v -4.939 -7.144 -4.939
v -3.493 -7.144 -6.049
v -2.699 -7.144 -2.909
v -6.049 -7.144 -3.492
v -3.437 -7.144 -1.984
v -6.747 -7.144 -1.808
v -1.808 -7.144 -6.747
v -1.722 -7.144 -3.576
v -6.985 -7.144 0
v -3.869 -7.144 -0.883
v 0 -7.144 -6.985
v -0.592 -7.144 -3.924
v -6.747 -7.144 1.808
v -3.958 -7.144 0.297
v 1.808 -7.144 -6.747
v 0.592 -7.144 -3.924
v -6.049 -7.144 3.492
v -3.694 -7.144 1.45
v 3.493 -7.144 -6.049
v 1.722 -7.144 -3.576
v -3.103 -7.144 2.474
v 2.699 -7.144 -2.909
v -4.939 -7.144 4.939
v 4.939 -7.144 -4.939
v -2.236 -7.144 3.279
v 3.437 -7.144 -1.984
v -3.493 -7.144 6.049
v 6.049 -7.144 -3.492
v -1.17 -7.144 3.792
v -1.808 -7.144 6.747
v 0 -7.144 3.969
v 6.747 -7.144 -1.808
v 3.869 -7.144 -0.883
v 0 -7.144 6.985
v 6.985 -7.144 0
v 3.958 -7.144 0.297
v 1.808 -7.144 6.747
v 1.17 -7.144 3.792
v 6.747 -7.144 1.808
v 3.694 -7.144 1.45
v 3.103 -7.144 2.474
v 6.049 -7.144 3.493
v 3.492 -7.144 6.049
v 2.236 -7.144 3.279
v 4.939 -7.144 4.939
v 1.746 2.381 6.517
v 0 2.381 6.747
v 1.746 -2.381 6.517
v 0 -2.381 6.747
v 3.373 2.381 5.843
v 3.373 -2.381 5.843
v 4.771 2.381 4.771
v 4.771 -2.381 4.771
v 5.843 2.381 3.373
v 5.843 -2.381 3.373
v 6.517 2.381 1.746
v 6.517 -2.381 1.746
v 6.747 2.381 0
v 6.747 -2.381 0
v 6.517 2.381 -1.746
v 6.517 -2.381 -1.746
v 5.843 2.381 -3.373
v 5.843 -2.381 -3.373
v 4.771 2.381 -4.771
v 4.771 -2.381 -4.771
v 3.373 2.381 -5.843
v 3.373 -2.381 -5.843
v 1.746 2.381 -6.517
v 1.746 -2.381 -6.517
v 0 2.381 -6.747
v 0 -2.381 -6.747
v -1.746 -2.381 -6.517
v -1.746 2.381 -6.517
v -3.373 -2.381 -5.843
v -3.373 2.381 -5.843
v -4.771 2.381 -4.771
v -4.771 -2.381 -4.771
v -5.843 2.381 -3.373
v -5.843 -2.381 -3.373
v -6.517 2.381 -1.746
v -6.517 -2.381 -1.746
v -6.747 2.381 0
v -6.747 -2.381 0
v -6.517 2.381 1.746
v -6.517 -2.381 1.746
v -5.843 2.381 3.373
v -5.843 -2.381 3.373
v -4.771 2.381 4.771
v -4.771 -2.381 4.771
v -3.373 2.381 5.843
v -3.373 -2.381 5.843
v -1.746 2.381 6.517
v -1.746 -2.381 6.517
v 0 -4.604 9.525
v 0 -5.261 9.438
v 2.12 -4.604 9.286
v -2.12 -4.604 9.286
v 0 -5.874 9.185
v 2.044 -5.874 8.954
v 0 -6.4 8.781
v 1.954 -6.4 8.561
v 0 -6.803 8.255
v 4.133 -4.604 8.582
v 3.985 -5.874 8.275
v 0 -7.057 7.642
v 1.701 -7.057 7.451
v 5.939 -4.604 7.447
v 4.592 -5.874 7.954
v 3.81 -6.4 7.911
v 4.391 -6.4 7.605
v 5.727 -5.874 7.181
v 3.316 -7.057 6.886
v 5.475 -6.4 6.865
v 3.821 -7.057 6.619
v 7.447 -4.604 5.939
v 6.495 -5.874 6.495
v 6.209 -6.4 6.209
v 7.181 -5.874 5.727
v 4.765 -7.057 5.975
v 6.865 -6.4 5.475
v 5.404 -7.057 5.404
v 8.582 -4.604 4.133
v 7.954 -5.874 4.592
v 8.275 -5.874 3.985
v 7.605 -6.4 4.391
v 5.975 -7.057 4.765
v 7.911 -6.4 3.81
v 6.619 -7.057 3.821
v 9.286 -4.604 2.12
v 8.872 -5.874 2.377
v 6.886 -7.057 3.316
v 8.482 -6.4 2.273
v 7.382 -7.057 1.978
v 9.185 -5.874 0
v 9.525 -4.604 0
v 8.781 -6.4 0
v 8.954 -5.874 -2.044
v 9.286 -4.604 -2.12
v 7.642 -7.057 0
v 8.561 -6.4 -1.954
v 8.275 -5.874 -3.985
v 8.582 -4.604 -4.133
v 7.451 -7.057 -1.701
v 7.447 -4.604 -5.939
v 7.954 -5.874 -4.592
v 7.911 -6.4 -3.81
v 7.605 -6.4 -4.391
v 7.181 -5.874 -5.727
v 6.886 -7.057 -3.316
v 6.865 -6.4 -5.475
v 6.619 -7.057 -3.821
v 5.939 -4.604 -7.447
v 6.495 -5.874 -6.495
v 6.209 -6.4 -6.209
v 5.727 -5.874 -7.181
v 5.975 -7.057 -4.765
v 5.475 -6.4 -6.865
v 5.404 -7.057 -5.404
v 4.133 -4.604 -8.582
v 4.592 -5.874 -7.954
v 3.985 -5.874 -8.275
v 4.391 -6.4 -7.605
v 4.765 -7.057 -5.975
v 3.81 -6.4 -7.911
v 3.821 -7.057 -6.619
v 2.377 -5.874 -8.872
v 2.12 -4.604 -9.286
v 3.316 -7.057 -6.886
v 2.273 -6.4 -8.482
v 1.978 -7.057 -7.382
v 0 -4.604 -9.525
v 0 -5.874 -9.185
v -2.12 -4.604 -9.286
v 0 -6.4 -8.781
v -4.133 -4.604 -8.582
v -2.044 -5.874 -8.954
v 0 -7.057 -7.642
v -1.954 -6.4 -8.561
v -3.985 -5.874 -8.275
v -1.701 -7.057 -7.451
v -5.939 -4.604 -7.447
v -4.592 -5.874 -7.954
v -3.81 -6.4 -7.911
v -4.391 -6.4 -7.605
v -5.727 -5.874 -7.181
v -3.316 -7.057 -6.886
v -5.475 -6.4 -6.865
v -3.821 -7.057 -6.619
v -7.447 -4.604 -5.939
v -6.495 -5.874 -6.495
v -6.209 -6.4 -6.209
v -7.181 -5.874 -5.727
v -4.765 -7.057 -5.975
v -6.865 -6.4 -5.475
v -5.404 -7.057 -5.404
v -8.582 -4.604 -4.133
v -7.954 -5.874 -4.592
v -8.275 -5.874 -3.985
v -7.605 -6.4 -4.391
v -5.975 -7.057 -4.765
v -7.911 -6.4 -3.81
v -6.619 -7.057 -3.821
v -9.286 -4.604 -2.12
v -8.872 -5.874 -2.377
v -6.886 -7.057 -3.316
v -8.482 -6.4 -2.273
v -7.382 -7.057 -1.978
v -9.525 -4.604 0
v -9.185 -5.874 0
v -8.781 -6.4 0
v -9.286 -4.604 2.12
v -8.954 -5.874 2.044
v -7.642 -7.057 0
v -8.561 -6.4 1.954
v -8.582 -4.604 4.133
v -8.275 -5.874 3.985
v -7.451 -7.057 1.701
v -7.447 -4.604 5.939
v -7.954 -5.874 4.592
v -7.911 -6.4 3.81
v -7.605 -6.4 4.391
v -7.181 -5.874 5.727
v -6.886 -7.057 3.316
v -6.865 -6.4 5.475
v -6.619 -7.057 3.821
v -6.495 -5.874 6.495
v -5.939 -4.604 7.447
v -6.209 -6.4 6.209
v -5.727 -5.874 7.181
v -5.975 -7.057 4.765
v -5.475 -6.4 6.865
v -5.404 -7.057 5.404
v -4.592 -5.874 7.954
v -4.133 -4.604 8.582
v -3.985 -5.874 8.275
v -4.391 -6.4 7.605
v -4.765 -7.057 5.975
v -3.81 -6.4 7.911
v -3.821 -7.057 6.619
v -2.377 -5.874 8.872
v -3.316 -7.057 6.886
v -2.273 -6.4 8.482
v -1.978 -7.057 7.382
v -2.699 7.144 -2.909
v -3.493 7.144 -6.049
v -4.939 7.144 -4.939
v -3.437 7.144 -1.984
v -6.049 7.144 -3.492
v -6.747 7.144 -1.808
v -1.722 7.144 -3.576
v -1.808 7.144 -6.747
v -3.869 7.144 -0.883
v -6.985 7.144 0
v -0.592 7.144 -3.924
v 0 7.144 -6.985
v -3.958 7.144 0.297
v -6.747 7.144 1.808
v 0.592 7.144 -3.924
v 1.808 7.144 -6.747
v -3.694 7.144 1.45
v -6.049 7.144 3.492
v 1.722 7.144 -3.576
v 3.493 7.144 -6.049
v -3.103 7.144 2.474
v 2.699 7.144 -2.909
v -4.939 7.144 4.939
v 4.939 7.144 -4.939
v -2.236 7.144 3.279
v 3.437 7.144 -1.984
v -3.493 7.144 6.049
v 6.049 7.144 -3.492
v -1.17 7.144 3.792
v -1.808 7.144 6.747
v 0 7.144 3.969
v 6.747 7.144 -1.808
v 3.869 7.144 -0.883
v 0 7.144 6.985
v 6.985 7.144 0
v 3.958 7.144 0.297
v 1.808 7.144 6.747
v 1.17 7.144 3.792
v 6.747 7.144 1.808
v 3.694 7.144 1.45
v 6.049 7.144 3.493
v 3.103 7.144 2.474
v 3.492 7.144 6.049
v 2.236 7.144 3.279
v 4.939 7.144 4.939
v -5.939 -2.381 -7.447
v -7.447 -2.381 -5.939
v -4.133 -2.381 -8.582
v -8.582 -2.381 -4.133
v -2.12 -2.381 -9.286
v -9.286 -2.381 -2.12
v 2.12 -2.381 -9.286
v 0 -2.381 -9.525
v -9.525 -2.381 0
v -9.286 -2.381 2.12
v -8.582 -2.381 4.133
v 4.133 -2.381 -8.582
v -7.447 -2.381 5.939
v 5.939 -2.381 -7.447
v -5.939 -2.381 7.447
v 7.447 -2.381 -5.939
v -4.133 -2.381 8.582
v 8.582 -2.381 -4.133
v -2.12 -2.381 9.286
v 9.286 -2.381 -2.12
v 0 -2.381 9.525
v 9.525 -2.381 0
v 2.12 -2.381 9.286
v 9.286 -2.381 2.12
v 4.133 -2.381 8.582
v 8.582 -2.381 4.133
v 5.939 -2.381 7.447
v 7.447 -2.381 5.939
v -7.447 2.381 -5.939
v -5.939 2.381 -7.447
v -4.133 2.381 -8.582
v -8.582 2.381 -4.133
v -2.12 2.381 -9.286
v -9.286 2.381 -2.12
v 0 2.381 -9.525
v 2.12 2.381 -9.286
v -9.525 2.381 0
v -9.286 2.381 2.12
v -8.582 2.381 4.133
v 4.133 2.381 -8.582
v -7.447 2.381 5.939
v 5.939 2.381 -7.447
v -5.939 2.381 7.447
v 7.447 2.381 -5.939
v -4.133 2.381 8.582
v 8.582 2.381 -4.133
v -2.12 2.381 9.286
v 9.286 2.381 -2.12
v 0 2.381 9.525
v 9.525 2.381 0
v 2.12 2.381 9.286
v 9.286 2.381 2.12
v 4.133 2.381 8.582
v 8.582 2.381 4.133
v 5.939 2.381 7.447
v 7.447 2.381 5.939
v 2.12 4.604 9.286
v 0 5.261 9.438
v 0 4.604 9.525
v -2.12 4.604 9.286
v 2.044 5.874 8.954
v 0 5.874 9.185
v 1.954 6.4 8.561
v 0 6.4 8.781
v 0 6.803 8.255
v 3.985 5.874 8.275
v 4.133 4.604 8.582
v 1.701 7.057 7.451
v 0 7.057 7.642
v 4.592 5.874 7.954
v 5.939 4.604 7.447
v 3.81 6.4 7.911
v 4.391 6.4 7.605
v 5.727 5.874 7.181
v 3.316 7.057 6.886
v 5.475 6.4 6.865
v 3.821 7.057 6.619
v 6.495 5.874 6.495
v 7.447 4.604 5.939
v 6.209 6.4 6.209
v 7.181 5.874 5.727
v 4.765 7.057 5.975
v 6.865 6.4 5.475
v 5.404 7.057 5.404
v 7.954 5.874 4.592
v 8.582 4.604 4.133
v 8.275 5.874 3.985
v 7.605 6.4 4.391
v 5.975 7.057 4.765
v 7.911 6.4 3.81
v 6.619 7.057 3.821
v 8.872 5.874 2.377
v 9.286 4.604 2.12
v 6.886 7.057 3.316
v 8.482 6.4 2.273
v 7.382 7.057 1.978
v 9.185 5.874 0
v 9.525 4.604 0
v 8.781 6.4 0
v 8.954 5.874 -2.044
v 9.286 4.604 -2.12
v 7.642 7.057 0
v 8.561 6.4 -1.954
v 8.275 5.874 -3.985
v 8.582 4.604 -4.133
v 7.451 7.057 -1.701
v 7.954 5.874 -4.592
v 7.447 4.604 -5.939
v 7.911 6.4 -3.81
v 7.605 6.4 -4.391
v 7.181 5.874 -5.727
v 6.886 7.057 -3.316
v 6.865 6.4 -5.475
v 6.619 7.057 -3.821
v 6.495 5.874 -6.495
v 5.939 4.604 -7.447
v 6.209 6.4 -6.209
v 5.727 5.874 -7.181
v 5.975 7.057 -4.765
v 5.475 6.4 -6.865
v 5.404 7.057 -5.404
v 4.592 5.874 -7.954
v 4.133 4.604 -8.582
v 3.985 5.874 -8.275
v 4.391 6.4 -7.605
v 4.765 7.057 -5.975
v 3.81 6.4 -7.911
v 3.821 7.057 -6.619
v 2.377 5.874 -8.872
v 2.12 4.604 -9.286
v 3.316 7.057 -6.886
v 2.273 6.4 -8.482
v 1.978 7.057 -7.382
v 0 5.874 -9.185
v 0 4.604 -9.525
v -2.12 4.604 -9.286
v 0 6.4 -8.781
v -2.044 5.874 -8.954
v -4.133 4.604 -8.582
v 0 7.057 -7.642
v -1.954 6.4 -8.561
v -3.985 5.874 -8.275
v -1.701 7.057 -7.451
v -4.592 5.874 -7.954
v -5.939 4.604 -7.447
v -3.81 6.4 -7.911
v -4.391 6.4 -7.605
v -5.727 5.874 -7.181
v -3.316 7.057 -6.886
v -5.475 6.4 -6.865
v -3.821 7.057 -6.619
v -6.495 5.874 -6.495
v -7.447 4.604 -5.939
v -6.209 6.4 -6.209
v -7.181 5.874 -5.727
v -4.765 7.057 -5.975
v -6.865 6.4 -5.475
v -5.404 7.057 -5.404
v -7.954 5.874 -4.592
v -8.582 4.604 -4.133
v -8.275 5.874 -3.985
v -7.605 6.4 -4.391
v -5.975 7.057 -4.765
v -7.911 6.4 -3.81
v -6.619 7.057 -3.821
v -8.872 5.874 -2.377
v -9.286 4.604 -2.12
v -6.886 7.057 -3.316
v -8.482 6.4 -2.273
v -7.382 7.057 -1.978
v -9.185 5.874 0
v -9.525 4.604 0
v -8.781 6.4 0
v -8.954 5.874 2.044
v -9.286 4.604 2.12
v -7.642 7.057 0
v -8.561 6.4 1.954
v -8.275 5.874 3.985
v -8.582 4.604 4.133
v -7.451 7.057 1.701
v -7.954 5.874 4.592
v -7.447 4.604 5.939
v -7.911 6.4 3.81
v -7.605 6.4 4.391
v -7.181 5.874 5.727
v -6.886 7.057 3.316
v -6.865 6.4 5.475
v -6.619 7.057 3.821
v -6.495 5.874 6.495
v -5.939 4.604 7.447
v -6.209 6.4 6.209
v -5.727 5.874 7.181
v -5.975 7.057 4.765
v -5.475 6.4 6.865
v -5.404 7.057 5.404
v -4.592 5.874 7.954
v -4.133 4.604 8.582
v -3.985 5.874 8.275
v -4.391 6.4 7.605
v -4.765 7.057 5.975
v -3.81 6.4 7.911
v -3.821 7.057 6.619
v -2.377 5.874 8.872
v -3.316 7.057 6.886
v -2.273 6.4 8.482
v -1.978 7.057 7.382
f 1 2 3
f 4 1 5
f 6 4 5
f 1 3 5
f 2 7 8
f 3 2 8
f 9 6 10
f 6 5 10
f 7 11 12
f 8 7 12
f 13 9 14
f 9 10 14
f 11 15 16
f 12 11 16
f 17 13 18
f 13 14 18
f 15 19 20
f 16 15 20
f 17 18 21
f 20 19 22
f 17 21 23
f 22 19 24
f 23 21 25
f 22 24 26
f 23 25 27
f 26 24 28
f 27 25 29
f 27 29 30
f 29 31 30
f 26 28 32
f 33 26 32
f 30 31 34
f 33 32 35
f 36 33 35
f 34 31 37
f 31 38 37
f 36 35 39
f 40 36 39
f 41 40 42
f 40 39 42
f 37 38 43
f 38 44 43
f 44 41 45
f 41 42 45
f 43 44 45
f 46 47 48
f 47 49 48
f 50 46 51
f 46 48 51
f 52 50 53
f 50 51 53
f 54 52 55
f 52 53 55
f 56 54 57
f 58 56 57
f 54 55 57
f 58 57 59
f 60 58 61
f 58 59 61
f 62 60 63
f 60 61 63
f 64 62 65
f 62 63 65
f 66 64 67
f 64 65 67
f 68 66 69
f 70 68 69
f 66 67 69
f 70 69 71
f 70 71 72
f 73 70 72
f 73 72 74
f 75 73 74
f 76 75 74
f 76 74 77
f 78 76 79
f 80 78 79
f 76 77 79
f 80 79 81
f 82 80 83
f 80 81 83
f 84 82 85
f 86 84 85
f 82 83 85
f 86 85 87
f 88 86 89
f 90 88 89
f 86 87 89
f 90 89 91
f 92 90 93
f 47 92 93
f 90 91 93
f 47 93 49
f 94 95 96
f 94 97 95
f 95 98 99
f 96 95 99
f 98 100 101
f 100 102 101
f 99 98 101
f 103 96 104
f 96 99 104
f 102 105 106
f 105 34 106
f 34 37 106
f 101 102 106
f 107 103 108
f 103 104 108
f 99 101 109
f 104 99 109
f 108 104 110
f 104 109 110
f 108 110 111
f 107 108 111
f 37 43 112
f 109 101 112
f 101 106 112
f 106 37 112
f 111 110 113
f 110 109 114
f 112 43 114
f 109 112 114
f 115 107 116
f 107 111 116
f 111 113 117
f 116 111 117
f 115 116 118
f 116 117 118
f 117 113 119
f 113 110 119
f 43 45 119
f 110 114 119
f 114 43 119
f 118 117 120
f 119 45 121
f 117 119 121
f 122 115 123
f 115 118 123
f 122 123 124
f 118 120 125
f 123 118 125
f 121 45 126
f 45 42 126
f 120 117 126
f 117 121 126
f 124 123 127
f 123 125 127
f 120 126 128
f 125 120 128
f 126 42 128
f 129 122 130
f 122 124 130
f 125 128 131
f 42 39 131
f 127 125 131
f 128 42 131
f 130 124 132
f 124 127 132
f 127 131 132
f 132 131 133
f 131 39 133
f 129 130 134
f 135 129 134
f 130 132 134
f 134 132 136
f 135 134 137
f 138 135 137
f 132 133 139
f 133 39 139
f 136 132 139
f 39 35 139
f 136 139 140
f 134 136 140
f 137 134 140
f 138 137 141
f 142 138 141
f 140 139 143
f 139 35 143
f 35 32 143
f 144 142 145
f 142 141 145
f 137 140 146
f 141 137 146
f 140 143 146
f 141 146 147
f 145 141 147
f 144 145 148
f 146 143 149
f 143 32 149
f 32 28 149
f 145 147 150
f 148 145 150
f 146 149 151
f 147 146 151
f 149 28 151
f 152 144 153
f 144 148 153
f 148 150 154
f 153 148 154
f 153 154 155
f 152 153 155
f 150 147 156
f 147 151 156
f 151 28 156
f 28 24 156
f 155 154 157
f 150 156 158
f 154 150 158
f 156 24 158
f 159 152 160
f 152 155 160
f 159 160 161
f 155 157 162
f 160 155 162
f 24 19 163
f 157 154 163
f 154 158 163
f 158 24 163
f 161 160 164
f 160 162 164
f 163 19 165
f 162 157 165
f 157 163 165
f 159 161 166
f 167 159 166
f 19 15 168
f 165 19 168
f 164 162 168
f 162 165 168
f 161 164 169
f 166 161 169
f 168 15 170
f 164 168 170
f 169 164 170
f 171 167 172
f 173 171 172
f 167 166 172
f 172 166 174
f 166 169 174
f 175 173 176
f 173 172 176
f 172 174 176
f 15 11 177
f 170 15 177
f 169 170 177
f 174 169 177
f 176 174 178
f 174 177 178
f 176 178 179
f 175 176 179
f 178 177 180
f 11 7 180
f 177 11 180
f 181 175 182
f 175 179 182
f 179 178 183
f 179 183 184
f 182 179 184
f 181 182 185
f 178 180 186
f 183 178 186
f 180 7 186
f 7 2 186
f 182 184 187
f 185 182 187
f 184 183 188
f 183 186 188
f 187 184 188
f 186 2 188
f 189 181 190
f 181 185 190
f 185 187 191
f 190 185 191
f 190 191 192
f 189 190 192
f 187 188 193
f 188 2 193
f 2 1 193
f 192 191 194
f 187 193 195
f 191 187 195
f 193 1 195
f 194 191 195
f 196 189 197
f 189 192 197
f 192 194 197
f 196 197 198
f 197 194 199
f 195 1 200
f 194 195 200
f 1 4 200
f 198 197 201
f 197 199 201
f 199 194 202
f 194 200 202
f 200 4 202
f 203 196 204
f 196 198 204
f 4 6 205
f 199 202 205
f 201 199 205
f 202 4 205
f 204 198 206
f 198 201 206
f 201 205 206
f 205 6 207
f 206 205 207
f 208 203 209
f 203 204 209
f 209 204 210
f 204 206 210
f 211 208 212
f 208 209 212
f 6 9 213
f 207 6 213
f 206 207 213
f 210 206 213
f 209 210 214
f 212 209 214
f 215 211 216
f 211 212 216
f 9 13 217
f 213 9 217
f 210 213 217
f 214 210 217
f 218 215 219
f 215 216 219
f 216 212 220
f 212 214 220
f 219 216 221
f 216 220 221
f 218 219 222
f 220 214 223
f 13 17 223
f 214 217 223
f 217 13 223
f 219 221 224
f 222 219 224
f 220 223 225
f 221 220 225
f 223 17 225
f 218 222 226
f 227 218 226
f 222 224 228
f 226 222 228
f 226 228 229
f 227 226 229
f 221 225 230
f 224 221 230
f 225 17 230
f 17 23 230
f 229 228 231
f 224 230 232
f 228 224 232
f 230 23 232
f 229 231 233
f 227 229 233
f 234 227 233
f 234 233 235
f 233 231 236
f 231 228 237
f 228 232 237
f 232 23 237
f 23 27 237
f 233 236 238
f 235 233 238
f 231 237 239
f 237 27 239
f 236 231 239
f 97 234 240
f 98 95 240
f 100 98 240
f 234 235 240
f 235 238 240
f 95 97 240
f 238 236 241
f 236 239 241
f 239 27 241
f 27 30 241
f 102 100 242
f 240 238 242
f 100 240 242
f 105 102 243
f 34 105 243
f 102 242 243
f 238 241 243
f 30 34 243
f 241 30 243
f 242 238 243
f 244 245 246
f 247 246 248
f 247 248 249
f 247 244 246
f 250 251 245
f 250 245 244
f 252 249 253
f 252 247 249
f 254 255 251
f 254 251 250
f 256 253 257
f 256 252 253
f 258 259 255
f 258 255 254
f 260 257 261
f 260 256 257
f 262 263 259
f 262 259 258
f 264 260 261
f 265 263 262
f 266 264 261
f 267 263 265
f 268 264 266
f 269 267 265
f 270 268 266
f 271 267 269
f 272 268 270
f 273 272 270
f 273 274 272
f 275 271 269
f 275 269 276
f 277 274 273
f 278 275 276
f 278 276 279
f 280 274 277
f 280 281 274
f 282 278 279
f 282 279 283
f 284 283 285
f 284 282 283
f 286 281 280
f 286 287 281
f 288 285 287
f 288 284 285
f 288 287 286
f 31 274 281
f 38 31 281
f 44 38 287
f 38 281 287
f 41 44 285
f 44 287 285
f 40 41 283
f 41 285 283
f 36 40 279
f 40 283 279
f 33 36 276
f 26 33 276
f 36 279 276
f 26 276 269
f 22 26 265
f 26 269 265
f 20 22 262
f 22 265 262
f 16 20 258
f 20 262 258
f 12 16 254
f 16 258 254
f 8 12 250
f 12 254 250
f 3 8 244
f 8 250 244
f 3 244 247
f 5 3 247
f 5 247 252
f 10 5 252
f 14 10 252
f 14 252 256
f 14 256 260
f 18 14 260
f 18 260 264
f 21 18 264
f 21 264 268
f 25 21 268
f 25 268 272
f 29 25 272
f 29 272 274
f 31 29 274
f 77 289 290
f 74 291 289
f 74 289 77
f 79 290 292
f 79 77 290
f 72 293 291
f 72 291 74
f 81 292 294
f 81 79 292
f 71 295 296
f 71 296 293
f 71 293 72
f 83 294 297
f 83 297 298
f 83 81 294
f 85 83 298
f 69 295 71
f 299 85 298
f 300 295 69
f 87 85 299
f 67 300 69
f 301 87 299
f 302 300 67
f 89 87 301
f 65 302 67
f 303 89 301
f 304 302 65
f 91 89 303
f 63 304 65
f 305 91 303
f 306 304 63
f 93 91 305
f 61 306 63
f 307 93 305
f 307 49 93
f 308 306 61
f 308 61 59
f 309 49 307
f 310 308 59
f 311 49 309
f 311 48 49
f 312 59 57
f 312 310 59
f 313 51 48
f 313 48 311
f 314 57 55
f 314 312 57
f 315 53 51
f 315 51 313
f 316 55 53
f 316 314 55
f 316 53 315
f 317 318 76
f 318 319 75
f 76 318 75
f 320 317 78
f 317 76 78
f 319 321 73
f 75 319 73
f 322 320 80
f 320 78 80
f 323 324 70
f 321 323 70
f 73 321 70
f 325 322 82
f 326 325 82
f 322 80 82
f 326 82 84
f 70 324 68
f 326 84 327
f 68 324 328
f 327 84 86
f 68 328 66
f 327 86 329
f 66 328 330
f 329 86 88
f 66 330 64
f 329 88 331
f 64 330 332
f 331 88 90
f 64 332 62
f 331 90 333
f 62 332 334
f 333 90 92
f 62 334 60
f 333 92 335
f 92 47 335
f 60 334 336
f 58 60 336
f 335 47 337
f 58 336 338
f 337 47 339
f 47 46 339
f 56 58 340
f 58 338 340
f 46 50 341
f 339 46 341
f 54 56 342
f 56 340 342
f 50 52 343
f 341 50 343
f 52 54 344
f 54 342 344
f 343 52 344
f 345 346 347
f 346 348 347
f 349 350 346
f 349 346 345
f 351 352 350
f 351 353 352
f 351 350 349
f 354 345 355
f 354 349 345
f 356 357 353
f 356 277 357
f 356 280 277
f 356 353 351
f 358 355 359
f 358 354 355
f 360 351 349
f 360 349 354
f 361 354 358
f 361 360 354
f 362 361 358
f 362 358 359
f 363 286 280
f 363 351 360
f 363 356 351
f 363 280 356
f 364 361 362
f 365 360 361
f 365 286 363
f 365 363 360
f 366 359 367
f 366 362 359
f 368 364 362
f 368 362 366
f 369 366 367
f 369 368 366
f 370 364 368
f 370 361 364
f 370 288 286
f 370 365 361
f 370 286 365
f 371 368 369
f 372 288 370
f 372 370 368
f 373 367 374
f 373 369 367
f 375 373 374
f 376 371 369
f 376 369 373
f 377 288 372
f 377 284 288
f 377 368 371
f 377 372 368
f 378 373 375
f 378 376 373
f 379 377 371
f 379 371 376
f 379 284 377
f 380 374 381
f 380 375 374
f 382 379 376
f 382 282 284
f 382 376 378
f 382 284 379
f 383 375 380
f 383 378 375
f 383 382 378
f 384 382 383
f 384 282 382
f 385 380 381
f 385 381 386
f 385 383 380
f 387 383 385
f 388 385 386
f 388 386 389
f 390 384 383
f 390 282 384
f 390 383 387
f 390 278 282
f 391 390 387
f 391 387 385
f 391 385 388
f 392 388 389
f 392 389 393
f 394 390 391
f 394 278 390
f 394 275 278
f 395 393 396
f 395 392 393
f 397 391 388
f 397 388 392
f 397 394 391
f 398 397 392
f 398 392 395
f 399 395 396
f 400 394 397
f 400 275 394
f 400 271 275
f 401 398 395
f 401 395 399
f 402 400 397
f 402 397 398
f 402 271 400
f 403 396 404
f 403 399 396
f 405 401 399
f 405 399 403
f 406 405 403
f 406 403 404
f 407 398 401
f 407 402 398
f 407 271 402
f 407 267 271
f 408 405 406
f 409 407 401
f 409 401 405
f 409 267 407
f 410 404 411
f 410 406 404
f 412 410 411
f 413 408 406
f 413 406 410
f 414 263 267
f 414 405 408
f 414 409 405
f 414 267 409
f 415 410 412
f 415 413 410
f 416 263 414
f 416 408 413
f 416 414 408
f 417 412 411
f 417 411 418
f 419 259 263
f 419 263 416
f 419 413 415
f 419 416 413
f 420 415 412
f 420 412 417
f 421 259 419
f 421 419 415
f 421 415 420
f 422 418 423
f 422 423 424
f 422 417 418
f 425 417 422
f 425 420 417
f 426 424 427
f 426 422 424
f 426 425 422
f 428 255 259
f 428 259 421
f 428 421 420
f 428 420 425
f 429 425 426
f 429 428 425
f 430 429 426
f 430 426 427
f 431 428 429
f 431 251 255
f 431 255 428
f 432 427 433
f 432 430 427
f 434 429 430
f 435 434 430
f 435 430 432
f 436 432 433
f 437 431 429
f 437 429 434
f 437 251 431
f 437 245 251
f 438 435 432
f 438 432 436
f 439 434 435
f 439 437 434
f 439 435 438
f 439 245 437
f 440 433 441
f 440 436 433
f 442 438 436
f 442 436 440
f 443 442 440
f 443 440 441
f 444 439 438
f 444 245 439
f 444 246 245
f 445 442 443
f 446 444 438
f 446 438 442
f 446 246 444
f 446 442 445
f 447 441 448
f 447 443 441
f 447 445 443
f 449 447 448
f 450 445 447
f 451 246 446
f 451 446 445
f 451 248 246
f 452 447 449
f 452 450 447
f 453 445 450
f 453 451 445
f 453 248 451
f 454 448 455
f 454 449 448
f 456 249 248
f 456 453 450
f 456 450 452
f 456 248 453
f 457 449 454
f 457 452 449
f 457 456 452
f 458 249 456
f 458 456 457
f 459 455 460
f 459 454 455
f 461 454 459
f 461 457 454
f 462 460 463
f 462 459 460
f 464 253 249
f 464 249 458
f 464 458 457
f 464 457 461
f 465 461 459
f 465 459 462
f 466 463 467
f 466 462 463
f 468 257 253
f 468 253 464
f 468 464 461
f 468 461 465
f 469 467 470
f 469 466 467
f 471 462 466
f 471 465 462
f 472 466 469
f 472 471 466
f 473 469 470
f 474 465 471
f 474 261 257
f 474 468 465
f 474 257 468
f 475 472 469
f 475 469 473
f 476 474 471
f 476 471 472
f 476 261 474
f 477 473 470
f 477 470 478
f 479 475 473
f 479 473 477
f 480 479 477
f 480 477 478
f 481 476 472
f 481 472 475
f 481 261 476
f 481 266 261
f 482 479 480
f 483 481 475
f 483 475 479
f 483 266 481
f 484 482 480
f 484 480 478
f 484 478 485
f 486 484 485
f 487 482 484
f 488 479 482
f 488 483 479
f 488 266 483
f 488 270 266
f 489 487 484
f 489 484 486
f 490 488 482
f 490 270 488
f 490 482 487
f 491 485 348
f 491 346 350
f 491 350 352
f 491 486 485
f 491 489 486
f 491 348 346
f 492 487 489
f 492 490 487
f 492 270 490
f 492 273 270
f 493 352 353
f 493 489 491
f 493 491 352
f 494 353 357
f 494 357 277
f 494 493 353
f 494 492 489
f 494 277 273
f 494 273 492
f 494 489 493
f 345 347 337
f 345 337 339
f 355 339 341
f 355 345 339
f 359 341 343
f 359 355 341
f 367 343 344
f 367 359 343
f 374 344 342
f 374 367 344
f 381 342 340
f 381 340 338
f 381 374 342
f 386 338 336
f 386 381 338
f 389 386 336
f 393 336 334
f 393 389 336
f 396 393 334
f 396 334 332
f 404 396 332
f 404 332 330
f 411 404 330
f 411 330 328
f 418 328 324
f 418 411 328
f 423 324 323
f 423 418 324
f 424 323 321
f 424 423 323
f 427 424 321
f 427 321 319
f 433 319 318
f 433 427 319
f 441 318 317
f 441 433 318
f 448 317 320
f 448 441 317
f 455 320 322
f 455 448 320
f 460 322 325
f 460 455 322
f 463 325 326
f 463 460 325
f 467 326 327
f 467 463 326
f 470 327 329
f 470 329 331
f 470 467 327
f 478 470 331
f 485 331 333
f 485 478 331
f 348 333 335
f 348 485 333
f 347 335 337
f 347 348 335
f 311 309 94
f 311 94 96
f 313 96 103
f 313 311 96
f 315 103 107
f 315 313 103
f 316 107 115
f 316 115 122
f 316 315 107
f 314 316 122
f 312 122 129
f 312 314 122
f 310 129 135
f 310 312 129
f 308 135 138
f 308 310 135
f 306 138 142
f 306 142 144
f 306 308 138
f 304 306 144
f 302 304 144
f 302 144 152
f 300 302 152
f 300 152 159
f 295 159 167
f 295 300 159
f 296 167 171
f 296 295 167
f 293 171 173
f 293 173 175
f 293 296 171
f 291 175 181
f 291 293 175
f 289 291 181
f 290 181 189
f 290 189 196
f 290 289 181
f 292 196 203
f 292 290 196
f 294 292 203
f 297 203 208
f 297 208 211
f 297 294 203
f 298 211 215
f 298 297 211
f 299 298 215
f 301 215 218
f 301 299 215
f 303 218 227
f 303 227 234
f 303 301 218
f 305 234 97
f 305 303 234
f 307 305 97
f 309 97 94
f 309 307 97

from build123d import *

# Parameters (mm, degrees)
SKETCH2_R           = 9.525
BOSS_EXTRUDE1_DEPTH = 7.14375
SKETCH3_R           = 9.525
SKETCH3_R_2         = 6.746875
CUT_EXTRUDE1_DEPTH  = 2.38125
FILLET1_R           = 2.54
SKETCH4_R           = 3.96875
CUT_EXTRUDE2_DEPTH  = 20.636290542


with BuildPart() as part:
    # Sketch2 → Boss-Extrude1 (new, symmetric)
    with BuildSketch(Plane(origin=(0, 0, 0), x_dir=(1, 0, 0), z_dir=(0, 1, 0))):
        with Locations(Location((0, 0, 0), (0, 0, 270))):
            Circle(SKETCH2_R)
    extrude(amount=BOSS_EXTRUDE1_DEPTH, both=True)

    # Sketch3 → Cut-Extrude1 (cut, symmetric)
    with BuildSketch(Plane(origin=(0, 0, 0), x_dir=(1, 0, 0), z_dir=(0, 1, 0))):
        with Locations(Location((0, 0, 0), (0, 0, 270))):
            Circle(SKETCH3_R)
        with Locations(Location((0, 0, 0), (0, 0, 270))):
            Circle(SKETCH3_R_2, mode=Mode.SUBTRACT)
    extrude(amount=CUT_EXTRUDE1_DEPTH, both=True, mode=Mode.SUBTRACT)

    # Fillet1
    fillet1_edges = [part.edges().sort_by_distance(p)[0] for p in [
        (0, -7.14375, -9.525),
        (0, 7.14375, -9.525),
    ]]
    fillet(fillet1_edges, radius=FILLET1_R)

    # Sketch4 → Cut-Extrude2 (cut, through all)
    with BuildSketch(Plane(origin=(0, 7.14375, 0), x_dir=(1, 0, 0), z_dir=(0, 1, 0))):
        with Locations(Location((0, 0, 0), (0, 0, 270))):
            Circle(SKETCH4_R)
    extrude(amount=-CUT_EXTRUDE2_DEPTH, mode=Mode.SUBTRACT)


solid = part.part
